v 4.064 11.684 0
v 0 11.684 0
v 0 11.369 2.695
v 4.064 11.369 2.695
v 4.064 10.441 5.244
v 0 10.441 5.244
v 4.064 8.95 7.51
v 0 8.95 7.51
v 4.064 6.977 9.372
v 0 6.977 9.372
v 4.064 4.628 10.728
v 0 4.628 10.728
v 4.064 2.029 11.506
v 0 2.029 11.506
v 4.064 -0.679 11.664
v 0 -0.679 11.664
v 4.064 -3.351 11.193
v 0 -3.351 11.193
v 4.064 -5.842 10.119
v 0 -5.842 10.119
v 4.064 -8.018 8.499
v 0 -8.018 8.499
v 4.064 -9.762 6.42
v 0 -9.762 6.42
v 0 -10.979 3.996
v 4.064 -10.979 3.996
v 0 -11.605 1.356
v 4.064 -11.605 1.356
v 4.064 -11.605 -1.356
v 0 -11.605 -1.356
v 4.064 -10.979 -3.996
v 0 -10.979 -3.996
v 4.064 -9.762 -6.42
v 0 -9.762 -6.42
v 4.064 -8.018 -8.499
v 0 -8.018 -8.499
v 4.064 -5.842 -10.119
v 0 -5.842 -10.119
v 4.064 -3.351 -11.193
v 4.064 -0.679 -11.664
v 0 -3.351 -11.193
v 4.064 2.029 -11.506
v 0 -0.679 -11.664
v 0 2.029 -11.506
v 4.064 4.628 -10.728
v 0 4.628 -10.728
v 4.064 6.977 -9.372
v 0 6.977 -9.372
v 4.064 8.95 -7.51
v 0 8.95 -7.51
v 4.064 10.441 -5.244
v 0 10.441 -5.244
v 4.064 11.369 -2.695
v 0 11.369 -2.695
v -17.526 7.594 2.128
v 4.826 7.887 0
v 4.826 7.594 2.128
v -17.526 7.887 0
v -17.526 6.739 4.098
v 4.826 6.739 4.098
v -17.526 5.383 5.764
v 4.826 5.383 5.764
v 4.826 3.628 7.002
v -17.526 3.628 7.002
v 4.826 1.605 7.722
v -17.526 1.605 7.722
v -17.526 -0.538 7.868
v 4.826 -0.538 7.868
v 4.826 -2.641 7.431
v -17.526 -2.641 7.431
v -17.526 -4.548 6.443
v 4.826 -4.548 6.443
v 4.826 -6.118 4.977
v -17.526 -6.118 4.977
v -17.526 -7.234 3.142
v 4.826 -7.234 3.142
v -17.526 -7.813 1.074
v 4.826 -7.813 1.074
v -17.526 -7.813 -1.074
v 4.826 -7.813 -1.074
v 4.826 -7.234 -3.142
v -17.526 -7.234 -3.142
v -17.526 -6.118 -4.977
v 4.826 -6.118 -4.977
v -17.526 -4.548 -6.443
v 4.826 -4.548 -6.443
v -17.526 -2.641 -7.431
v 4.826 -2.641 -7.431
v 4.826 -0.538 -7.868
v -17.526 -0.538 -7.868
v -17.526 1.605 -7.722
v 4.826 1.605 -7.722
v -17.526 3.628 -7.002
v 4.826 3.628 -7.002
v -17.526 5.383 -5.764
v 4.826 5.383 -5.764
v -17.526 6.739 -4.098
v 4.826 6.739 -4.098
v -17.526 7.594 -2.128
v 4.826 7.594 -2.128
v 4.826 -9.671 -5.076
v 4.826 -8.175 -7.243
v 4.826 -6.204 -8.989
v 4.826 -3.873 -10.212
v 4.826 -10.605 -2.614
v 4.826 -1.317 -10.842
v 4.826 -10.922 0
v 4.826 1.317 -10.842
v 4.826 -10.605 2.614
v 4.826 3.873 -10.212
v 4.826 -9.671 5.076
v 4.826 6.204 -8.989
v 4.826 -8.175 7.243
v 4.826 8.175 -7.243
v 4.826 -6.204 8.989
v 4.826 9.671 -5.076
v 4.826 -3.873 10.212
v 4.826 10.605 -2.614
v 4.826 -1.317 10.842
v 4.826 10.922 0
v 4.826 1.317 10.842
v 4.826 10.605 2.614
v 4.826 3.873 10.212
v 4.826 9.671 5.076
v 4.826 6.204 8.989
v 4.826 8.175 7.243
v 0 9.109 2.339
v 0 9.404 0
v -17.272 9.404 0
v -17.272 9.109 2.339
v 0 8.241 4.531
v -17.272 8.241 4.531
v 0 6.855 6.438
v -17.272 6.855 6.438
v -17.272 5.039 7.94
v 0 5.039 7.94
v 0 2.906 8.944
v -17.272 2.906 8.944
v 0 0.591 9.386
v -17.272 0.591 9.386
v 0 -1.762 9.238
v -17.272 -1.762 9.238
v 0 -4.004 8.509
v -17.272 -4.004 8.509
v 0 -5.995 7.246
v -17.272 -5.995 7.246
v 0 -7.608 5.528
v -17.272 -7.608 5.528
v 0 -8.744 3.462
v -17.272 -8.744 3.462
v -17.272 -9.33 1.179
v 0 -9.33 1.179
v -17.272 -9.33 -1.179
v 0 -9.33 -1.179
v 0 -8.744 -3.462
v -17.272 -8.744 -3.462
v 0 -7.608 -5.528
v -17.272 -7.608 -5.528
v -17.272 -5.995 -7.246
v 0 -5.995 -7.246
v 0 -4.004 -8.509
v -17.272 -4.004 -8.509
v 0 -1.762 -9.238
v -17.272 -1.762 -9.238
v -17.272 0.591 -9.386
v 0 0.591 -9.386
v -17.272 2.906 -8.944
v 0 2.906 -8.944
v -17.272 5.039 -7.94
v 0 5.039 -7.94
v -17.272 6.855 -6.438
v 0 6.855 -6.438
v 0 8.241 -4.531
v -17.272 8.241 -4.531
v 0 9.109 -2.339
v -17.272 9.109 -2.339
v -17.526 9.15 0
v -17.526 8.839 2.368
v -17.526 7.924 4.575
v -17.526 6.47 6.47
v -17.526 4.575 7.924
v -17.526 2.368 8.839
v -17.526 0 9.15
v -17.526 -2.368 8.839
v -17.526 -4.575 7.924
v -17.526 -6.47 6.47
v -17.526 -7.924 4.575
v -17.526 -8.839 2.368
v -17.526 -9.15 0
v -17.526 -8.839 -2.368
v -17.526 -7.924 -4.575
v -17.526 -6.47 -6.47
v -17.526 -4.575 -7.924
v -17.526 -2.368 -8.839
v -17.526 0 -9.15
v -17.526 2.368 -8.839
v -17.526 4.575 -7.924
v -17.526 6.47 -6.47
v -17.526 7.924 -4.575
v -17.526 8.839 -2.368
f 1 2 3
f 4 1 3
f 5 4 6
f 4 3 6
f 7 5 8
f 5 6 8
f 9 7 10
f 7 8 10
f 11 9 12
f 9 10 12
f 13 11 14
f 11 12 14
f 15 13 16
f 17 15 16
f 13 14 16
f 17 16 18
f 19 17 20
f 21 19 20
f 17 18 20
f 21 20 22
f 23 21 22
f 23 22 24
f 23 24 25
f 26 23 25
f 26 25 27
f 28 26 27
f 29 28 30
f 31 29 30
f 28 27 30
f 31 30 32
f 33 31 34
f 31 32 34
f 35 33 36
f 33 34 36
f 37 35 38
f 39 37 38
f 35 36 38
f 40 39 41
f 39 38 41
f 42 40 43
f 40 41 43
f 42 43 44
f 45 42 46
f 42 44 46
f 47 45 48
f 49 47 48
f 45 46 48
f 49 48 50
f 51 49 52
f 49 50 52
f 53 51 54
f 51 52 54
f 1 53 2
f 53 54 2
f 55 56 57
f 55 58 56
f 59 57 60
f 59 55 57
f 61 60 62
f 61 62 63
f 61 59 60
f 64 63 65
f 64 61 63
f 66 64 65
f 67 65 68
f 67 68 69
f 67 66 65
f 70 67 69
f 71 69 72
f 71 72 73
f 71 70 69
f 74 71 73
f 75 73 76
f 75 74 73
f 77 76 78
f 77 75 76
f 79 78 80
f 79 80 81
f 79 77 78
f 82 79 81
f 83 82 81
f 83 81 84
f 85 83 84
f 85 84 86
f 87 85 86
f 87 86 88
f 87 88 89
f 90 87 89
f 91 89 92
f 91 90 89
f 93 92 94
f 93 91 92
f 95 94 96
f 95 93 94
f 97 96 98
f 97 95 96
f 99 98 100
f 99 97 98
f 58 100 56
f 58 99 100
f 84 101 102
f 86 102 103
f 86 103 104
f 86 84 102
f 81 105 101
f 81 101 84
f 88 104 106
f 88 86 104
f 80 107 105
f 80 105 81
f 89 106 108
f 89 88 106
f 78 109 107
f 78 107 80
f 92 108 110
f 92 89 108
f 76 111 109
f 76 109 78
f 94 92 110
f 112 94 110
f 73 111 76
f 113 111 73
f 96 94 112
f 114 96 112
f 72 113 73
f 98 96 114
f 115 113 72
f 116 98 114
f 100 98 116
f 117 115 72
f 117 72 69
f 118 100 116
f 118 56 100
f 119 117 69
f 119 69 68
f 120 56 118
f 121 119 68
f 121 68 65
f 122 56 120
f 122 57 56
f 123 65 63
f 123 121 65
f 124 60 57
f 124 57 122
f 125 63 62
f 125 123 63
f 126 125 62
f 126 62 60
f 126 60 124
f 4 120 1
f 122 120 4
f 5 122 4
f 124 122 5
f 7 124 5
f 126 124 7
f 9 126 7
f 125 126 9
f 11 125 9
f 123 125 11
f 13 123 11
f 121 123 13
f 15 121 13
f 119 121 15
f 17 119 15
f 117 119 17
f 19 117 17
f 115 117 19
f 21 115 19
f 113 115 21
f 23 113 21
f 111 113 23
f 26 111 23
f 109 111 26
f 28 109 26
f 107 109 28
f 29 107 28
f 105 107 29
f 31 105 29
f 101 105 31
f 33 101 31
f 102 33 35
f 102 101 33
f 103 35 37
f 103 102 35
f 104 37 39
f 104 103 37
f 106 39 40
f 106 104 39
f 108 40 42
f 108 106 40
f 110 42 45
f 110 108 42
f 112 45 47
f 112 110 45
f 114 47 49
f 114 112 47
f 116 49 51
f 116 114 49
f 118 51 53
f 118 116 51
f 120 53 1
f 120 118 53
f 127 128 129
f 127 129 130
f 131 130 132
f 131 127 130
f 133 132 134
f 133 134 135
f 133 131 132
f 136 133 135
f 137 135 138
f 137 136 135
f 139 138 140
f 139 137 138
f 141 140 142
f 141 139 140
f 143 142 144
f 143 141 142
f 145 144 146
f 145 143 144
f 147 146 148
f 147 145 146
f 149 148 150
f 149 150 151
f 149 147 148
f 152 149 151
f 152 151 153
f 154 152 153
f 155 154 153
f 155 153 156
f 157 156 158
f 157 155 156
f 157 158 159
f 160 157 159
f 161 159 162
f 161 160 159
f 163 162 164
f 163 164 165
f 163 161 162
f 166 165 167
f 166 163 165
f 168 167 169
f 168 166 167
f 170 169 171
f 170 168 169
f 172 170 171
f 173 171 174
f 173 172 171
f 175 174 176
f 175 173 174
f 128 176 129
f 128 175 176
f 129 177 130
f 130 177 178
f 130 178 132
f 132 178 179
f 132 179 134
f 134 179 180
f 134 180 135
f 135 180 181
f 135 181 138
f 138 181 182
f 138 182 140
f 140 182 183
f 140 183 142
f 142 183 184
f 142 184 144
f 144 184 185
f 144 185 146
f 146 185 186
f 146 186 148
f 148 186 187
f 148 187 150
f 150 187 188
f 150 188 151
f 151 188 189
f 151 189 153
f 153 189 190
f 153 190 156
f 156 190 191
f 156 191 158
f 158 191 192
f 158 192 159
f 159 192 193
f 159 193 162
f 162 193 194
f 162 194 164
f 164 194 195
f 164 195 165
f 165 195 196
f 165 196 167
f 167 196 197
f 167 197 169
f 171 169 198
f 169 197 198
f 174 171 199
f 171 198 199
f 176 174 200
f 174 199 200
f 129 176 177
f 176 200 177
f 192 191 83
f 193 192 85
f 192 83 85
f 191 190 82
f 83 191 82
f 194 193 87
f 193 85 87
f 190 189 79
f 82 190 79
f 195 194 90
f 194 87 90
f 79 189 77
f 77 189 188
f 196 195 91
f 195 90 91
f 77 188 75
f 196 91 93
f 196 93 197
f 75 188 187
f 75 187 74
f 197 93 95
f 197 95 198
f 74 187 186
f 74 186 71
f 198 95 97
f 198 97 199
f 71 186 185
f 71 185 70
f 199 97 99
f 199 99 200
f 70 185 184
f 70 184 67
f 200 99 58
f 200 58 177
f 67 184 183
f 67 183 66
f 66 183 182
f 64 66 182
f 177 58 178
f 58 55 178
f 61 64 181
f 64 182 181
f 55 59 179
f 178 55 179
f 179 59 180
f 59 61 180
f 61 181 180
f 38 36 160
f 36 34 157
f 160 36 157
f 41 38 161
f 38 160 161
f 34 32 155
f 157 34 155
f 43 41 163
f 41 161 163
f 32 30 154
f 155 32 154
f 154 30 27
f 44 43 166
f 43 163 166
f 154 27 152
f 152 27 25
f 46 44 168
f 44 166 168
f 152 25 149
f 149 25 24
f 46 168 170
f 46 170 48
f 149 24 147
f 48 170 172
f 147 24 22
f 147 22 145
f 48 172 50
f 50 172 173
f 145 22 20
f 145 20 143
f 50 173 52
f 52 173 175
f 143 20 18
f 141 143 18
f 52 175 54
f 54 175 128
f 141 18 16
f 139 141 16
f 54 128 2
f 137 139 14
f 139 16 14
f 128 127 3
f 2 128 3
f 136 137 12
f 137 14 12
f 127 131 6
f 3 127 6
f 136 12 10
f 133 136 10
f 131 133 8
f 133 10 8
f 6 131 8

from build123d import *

# Parameters (mm, degrees)
F0_R     = 11.684
F0_R_2   = 9.40435
F0_R_3   = 7.8867
F1_DEPTH = 4.826
F2_DEPTH = 17.526
F3_SIZE  = 0.762
F4_SIZE  = 0.254


with BuildPart() as f1:
    # F0 (on Right) → F1 (new body)
    with BuildSketch(Plane.YZ):
        Circle(F0_R)
        Circle(F0_R_2, mode=Mode.SUBTRACT)
        Circle(F0_R_2)
        Circle(F0_R_3, mode=Mode.SUBTRACT)
    extrude(amount=F1_DEPTH)

    # F0 (on Right) → F2 (join)
    with BuildSketch(Plane.YZ):
        Circle(F0_R_2)
        Circle(F0_R_3, mode=Mode.SUBTRACT)
    extrude(amount=-F2_DEPTH)

    # F3
    f3_edges = [f1.edges().sort_by_distance(p)[0] for p in [
        (4.826, -11.684, 0),
    ]]
    chamfer(f3_edges, length=F3_SIZE)

    # F4
    f4_edges = [f1.edges().sort_by_distance(p)[0] for p in [
        (-17.526, -9.40435, 0),
    ]]
    chamfer(f4_edges, length=F4_SIZE)


solid = f1.part
